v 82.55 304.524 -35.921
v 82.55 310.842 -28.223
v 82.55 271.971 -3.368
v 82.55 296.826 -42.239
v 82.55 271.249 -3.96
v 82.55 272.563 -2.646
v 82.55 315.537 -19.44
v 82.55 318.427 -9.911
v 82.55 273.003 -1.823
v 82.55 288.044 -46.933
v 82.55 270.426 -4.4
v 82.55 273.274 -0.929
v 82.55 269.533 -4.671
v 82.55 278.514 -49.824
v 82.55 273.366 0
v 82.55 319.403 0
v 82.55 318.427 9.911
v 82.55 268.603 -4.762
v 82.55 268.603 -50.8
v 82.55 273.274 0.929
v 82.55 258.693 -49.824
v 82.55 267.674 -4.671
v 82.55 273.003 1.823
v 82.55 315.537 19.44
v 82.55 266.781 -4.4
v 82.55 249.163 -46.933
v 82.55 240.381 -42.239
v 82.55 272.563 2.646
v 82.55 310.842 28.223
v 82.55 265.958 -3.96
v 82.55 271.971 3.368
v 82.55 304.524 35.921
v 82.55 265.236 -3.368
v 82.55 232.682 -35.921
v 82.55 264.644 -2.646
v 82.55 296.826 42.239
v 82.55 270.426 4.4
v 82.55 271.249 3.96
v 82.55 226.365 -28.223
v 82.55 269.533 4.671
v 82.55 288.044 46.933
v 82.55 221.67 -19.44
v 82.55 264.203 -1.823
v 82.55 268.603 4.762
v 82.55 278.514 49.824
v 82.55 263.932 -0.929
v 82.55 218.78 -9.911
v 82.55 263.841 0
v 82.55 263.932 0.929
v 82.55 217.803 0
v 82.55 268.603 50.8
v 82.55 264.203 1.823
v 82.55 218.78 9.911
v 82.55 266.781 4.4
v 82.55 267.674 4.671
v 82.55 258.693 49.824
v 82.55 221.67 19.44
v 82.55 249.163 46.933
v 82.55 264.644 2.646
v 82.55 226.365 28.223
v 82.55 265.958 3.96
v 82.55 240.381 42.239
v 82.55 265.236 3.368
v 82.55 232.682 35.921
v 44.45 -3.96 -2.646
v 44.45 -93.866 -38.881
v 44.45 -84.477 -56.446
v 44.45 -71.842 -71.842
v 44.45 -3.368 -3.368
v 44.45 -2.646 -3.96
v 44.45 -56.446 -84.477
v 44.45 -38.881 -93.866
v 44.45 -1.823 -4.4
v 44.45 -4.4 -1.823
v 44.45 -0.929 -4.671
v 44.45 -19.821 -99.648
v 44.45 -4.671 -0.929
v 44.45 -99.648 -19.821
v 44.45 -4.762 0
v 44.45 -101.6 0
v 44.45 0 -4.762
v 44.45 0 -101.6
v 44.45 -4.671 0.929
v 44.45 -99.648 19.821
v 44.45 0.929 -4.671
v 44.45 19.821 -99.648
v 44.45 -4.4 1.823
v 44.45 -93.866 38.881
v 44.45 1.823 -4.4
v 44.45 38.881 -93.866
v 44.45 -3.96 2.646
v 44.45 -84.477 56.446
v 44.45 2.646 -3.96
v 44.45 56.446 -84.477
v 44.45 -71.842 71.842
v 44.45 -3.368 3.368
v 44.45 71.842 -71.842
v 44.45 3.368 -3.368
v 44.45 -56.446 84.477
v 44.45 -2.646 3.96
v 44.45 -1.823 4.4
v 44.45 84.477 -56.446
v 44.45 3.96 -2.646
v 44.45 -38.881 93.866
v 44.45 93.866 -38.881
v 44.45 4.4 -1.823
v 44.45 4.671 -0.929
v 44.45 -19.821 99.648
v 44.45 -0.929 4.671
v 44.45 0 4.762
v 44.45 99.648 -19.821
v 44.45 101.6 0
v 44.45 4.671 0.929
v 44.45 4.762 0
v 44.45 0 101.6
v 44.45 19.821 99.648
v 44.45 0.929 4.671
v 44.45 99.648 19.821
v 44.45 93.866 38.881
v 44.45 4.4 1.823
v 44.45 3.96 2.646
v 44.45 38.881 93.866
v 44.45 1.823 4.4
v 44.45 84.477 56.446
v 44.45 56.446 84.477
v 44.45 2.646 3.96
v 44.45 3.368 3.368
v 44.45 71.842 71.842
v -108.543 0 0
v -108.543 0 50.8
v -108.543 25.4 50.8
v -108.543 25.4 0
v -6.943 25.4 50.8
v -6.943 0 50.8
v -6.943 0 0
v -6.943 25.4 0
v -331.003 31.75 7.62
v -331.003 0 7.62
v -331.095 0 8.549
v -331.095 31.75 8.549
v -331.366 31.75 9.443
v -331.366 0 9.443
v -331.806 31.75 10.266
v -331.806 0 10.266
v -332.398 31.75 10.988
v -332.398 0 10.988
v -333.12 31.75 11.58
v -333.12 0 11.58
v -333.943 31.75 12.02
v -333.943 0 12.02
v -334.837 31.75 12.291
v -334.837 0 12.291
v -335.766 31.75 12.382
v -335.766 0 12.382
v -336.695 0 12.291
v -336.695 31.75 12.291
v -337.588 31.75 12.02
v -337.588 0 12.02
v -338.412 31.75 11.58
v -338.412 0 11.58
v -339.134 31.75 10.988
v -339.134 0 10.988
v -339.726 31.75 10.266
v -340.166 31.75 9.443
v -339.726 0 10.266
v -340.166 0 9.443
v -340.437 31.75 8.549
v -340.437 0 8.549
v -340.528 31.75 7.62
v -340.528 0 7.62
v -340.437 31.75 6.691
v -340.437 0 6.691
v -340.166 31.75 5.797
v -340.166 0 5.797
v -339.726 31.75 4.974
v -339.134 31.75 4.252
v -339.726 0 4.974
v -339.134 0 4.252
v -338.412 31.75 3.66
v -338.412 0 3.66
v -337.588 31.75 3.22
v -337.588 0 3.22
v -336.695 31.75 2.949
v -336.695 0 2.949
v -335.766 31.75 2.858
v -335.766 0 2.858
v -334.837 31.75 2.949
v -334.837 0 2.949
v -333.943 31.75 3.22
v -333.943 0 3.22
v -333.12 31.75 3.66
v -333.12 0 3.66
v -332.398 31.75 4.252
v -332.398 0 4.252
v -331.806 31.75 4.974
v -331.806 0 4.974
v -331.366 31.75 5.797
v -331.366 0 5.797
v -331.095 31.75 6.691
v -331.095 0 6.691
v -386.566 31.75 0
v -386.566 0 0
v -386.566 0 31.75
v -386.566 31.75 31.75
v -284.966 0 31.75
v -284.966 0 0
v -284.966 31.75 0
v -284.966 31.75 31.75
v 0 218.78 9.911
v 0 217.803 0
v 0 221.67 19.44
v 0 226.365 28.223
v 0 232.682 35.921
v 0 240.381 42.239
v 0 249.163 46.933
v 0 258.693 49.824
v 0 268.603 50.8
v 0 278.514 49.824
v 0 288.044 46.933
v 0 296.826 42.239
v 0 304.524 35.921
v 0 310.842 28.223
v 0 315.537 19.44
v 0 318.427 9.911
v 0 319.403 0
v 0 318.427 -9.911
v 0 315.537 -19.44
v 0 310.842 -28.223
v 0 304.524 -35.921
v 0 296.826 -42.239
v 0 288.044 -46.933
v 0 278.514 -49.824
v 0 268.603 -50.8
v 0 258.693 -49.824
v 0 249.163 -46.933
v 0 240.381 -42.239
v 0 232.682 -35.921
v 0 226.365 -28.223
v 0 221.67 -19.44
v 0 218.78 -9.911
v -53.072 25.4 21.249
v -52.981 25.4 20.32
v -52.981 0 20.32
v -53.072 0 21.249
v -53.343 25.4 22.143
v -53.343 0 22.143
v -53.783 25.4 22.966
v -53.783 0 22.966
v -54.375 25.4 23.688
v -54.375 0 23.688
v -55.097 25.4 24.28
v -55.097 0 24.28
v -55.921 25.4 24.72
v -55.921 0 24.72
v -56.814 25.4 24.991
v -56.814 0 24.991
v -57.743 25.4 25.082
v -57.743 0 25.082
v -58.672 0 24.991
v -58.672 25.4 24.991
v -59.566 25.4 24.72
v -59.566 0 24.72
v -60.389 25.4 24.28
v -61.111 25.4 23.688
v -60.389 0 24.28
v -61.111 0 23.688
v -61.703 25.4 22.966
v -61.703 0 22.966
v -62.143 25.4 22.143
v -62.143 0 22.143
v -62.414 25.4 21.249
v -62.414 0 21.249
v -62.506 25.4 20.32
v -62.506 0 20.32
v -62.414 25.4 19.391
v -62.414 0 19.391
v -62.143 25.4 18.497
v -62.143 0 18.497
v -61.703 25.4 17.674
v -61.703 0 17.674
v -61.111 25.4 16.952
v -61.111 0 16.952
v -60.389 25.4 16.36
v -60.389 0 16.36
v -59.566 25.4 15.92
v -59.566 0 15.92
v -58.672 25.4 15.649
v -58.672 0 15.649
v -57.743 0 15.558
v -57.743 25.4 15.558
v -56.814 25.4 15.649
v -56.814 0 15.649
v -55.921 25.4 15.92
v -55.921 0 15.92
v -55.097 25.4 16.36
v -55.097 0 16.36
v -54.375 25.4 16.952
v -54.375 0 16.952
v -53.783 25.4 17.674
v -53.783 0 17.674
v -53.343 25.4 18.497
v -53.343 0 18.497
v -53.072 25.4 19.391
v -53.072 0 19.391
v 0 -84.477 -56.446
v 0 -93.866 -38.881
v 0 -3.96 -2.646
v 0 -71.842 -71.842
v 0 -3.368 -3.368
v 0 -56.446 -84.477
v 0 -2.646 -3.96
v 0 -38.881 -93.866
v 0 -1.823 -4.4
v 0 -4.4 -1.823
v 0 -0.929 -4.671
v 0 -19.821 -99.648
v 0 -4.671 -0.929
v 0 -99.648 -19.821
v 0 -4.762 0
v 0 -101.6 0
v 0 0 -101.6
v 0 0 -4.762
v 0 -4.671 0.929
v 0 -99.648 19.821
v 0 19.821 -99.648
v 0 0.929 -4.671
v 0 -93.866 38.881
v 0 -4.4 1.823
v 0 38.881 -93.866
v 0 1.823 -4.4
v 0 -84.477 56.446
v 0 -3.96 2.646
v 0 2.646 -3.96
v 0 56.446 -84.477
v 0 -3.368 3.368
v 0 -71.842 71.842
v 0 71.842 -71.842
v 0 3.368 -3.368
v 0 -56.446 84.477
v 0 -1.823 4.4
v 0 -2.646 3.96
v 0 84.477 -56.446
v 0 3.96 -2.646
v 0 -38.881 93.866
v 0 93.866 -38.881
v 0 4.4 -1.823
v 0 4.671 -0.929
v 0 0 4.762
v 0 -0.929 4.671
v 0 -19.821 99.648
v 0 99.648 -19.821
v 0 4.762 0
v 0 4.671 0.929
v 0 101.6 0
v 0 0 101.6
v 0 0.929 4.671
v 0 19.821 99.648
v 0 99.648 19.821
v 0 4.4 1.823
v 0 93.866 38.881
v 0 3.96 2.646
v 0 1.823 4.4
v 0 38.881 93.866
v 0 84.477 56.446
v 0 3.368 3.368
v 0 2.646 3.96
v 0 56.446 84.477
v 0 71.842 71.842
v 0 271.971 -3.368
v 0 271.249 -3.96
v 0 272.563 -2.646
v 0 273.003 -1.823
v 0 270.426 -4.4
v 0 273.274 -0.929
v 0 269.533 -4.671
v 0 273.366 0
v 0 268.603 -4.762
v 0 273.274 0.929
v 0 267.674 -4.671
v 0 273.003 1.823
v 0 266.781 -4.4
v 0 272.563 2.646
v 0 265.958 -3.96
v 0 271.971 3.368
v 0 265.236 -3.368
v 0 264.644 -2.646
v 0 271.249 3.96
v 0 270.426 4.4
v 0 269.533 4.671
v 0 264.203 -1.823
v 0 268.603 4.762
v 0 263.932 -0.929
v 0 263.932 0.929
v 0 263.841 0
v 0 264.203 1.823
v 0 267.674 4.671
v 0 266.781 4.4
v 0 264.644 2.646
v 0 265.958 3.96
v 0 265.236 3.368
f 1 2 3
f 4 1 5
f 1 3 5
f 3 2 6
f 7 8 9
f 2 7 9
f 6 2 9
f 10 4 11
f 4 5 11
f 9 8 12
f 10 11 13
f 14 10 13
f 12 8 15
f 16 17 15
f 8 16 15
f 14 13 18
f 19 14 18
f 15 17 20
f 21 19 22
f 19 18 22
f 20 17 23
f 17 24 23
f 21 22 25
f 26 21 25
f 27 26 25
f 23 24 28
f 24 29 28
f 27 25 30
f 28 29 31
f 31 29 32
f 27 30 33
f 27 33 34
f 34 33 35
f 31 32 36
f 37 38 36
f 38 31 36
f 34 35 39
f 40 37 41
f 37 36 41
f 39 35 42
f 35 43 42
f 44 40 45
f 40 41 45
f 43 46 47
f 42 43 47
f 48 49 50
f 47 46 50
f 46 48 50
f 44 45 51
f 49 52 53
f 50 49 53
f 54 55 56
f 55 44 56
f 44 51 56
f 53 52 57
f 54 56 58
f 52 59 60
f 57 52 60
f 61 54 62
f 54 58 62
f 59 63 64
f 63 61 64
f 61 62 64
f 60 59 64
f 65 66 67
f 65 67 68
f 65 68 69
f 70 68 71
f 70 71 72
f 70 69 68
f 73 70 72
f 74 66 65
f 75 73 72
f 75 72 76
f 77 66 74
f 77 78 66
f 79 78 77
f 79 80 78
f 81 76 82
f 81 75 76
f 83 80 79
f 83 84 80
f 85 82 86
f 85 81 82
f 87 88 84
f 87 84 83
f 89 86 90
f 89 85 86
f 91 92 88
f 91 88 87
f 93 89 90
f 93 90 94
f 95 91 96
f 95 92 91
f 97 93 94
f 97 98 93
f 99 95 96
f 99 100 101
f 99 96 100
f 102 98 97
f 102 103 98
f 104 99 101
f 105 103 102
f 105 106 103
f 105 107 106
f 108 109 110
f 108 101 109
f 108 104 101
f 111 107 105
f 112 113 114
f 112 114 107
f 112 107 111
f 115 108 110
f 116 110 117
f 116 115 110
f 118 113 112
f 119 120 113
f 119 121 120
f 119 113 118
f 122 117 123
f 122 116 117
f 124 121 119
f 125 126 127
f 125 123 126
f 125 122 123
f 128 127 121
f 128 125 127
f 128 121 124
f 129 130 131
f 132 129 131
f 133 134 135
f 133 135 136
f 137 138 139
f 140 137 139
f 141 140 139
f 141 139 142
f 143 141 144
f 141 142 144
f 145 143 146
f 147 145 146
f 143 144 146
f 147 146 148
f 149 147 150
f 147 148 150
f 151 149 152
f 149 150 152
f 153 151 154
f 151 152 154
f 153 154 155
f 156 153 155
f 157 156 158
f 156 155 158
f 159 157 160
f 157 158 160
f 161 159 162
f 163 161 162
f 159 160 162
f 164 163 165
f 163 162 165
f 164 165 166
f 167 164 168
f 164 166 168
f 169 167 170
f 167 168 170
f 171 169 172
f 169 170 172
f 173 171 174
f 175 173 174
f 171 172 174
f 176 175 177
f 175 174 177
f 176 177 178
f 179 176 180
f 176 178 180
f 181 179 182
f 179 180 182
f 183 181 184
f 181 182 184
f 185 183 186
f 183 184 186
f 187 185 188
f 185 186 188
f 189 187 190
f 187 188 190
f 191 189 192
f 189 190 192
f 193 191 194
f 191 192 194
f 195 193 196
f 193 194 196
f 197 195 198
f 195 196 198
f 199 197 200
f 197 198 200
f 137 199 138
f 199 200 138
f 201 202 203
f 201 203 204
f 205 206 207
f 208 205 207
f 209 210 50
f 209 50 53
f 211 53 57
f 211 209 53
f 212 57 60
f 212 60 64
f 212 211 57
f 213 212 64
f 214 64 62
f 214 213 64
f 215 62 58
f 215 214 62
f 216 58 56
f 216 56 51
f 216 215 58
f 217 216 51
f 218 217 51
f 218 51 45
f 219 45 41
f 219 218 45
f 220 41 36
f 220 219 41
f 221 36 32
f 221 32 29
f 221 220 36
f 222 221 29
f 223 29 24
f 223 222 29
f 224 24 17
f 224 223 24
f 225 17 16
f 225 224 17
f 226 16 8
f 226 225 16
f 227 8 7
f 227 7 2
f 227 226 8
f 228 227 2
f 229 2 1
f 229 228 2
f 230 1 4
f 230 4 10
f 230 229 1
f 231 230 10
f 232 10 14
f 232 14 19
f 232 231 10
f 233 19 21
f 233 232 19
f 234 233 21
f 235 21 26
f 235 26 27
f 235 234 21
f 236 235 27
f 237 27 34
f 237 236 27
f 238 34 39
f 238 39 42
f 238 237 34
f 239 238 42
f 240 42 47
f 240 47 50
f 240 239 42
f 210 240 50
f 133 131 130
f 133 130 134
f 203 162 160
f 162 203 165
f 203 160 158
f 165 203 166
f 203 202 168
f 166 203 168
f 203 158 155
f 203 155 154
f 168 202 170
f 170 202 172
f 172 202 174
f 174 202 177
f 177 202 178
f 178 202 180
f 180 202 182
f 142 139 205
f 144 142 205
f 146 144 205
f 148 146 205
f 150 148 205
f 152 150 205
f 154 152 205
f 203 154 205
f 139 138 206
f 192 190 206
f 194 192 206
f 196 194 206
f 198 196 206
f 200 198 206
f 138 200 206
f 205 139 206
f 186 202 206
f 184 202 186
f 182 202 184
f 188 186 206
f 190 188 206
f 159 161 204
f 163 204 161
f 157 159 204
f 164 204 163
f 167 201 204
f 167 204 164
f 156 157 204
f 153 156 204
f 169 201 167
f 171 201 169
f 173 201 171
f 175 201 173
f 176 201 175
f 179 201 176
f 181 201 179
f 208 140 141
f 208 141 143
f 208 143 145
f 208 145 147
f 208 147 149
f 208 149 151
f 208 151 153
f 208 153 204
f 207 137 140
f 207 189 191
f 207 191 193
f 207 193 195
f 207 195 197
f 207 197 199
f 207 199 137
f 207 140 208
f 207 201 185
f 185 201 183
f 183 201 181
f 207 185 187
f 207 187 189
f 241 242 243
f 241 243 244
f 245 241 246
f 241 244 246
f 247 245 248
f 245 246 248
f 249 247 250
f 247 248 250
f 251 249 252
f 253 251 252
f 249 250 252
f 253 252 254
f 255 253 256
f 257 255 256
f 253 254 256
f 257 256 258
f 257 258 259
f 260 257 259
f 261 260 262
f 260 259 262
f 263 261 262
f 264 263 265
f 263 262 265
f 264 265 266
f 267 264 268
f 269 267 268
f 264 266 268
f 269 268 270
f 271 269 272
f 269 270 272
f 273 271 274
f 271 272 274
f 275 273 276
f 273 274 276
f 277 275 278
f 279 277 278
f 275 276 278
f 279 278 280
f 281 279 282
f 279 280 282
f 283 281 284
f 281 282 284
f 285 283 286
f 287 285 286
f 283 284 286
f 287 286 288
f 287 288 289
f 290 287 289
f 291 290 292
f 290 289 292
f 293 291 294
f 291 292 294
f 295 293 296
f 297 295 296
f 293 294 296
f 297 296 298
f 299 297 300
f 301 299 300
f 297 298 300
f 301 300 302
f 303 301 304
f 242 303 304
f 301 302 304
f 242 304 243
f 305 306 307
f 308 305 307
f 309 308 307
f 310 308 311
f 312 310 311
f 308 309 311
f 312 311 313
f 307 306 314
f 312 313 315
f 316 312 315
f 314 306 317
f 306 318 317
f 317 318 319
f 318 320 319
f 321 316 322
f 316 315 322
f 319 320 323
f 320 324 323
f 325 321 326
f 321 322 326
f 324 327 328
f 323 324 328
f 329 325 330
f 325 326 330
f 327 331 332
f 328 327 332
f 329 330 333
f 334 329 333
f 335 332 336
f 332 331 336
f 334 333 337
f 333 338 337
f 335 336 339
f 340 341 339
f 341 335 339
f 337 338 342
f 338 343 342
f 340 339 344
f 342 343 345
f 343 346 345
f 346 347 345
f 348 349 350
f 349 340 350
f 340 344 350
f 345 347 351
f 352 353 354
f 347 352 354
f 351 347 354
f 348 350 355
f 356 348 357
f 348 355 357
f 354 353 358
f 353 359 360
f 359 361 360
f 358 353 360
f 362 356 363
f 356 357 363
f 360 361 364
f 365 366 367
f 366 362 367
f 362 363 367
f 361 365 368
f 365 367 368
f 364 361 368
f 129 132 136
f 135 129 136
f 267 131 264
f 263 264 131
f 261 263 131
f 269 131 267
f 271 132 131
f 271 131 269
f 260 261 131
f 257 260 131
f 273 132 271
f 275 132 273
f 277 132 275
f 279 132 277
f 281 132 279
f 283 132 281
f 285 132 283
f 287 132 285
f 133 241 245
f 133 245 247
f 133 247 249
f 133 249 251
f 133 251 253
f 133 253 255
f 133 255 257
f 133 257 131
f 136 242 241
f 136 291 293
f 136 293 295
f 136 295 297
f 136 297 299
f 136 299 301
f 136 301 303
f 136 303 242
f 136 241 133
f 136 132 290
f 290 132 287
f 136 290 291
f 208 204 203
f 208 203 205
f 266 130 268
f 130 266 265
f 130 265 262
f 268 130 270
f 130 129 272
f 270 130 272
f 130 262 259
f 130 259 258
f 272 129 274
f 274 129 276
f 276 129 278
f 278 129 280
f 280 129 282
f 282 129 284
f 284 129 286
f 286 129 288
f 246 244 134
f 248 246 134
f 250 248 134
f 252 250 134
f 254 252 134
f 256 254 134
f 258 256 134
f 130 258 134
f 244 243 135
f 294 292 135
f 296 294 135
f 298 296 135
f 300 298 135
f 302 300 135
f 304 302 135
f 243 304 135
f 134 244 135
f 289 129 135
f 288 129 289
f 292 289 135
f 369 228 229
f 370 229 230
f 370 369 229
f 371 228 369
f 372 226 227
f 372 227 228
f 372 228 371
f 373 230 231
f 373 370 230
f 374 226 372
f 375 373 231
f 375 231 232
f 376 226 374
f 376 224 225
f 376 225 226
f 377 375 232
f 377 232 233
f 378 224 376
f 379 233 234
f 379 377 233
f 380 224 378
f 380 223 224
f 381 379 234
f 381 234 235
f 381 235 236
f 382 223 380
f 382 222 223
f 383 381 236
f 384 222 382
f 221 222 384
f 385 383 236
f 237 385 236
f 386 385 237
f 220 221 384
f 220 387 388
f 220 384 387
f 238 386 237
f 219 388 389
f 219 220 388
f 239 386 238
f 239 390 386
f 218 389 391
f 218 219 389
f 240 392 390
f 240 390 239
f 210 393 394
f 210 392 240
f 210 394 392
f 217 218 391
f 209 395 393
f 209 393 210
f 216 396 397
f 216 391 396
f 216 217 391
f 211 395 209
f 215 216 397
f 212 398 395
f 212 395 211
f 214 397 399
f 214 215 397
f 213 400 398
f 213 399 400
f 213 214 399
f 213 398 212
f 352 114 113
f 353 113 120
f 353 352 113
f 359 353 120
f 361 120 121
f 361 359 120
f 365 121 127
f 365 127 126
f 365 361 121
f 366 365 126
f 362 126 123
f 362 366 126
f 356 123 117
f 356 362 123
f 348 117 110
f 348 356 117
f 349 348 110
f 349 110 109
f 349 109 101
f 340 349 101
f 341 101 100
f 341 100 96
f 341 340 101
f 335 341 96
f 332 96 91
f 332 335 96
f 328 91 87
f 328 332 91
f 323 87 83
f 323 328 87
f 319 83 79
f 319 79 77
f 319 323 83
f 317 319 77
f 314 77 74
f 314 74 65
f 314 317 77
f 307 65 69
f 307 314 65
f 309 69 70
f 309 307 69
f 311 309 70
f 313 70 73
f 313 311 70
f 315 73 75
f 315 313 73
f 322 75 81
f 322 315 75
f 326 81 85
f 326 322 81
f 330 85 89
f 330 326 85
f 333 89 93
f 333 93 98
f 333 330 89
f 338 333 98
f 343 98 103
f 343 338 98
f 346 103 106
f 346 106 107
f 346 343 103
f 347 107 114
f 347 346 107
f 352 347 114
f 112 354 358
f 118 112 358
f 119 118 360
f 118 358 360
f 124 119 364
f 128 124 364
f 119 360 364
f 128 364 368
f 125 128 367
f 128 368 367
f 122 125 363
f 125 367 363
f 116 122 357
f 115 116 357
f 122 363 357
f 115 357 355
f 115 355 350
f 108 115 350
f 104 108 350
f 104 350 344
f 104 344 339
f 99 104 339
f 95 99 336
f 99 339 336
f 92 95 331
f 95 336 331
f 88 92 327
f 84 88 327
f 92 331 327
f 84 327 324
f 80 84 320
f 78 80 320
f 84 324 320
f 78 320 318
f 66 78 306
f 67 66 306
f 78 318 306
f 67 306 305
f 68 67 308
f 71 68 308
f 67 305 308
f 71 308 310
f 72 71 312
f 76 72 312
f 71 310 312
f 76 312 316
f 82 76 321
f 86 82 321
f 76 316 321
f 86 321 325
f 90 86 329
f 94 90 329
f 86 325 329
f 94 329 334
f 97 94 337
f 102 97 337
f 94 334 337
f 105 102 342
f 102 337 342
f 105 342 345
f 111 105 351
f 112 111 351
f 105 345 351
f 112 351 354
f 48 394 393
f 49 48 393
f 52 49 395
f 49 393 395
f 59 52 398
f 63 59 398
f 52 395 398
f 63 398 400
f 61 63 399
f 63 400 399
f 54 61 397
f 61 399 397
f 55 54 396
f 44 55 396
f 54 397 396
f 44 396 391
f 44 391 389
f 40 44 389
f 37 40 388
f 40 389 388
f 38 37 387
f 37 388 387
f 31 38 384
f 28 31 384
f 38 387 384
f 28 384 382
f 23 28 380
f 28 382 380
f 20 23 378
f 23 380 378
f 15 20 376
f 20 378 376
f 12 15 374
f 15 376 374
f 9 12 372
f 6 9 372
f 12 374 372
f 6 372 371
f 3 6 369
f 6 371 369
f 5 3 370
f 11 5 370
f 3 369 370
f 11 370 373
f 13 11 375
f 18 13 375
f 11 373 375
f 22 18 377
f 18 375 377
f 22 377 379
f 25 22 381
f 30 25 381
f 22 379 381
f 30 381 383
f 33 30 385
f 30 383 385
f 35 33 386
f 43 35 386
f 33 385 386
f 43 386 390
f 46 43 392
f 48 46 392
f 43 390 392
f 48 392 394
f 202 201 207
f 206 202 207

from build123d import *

# Parameters (mm, degrees)
F0_R      = 101.6
F0_R_2    = 4.7625
F1_DEPTH  = 44.45
F2_R      = 50.8
F2_R_2    = 4.7625
F3_DEPTH  = 82.55
F4_W      = 101.6
F4_H      = 25.4
F5_DEPTH  = 50.8
F6_R      = 4.7625
F7_DEPTH  = 25.4
F8_W      = 101.6
F8_H      = 31.75
F9_DEPTH  = 31.75
F10_R     = 4.7625
F11_DEPTH = 31.75


with BuildPart() as f1:
    # F0 (on Right) → F1 (new body)
    with BuildSketch(Plane.YZ):
        Circle(F0_R)
        Circle(F0_R_2, mode=Mode.SUBTRACT)
    extrude(amount=F1_DEPTH)


with BuildPart() as f3:
    # F2 (on face) → F3 (new body)
    with BuildSketch(Plane(origin=(0, 0, 0), x_dir=(0, -1, 0), z_dir=(-1, 0, 0))):
        with Locations((-268.603474, 0)):
            Circle(F2_R)
        with Locations((-268.603474, 0)):
            Circle(F2_R_2, mode=Mode.SUBTRACT)
    extrude(amount=-F3_DEPTH)


with BuildPart() as f5:
    # F4 (on Top) → F5 (new body)
    with BuildSketch(Plane.XY):
        with Locations((-57.743035, 12.7)):
            Rectangle(F4_W, F4_H)
    extrude(amount=F5_DEPTH)

    # F6 (on face) → F7 (cut, through all)
    with BuildSketch(Plane.XZ):
        with Locations((-57.743035, 20.32)):
            Circle(F6_R)
    extrude(amount=-F7_DEPTH, mode=Mode.SUBTRACT)


with BuildPart() as f9:
    # F8 (on Top) → F9 (new body)
    with BuildSketch(Plane.XY):
        with Locations((-335.765964, 15.875)):
            Rectangle(F8_W, F8_H)
    extrude(amount=F9_DEPTH)

    # F10 (on face) → F11 (cut, through all)
    with BuildSketch(Plane.XZ):
        with Locations((-335.765964, 7.62)):
            Circle(F10_R)
    extrude(amount=-F11_DEPTH, mode=Mode.SUBTRACT)


solid = Compound([f1.part, f3.part, f5.part, f9.part])
